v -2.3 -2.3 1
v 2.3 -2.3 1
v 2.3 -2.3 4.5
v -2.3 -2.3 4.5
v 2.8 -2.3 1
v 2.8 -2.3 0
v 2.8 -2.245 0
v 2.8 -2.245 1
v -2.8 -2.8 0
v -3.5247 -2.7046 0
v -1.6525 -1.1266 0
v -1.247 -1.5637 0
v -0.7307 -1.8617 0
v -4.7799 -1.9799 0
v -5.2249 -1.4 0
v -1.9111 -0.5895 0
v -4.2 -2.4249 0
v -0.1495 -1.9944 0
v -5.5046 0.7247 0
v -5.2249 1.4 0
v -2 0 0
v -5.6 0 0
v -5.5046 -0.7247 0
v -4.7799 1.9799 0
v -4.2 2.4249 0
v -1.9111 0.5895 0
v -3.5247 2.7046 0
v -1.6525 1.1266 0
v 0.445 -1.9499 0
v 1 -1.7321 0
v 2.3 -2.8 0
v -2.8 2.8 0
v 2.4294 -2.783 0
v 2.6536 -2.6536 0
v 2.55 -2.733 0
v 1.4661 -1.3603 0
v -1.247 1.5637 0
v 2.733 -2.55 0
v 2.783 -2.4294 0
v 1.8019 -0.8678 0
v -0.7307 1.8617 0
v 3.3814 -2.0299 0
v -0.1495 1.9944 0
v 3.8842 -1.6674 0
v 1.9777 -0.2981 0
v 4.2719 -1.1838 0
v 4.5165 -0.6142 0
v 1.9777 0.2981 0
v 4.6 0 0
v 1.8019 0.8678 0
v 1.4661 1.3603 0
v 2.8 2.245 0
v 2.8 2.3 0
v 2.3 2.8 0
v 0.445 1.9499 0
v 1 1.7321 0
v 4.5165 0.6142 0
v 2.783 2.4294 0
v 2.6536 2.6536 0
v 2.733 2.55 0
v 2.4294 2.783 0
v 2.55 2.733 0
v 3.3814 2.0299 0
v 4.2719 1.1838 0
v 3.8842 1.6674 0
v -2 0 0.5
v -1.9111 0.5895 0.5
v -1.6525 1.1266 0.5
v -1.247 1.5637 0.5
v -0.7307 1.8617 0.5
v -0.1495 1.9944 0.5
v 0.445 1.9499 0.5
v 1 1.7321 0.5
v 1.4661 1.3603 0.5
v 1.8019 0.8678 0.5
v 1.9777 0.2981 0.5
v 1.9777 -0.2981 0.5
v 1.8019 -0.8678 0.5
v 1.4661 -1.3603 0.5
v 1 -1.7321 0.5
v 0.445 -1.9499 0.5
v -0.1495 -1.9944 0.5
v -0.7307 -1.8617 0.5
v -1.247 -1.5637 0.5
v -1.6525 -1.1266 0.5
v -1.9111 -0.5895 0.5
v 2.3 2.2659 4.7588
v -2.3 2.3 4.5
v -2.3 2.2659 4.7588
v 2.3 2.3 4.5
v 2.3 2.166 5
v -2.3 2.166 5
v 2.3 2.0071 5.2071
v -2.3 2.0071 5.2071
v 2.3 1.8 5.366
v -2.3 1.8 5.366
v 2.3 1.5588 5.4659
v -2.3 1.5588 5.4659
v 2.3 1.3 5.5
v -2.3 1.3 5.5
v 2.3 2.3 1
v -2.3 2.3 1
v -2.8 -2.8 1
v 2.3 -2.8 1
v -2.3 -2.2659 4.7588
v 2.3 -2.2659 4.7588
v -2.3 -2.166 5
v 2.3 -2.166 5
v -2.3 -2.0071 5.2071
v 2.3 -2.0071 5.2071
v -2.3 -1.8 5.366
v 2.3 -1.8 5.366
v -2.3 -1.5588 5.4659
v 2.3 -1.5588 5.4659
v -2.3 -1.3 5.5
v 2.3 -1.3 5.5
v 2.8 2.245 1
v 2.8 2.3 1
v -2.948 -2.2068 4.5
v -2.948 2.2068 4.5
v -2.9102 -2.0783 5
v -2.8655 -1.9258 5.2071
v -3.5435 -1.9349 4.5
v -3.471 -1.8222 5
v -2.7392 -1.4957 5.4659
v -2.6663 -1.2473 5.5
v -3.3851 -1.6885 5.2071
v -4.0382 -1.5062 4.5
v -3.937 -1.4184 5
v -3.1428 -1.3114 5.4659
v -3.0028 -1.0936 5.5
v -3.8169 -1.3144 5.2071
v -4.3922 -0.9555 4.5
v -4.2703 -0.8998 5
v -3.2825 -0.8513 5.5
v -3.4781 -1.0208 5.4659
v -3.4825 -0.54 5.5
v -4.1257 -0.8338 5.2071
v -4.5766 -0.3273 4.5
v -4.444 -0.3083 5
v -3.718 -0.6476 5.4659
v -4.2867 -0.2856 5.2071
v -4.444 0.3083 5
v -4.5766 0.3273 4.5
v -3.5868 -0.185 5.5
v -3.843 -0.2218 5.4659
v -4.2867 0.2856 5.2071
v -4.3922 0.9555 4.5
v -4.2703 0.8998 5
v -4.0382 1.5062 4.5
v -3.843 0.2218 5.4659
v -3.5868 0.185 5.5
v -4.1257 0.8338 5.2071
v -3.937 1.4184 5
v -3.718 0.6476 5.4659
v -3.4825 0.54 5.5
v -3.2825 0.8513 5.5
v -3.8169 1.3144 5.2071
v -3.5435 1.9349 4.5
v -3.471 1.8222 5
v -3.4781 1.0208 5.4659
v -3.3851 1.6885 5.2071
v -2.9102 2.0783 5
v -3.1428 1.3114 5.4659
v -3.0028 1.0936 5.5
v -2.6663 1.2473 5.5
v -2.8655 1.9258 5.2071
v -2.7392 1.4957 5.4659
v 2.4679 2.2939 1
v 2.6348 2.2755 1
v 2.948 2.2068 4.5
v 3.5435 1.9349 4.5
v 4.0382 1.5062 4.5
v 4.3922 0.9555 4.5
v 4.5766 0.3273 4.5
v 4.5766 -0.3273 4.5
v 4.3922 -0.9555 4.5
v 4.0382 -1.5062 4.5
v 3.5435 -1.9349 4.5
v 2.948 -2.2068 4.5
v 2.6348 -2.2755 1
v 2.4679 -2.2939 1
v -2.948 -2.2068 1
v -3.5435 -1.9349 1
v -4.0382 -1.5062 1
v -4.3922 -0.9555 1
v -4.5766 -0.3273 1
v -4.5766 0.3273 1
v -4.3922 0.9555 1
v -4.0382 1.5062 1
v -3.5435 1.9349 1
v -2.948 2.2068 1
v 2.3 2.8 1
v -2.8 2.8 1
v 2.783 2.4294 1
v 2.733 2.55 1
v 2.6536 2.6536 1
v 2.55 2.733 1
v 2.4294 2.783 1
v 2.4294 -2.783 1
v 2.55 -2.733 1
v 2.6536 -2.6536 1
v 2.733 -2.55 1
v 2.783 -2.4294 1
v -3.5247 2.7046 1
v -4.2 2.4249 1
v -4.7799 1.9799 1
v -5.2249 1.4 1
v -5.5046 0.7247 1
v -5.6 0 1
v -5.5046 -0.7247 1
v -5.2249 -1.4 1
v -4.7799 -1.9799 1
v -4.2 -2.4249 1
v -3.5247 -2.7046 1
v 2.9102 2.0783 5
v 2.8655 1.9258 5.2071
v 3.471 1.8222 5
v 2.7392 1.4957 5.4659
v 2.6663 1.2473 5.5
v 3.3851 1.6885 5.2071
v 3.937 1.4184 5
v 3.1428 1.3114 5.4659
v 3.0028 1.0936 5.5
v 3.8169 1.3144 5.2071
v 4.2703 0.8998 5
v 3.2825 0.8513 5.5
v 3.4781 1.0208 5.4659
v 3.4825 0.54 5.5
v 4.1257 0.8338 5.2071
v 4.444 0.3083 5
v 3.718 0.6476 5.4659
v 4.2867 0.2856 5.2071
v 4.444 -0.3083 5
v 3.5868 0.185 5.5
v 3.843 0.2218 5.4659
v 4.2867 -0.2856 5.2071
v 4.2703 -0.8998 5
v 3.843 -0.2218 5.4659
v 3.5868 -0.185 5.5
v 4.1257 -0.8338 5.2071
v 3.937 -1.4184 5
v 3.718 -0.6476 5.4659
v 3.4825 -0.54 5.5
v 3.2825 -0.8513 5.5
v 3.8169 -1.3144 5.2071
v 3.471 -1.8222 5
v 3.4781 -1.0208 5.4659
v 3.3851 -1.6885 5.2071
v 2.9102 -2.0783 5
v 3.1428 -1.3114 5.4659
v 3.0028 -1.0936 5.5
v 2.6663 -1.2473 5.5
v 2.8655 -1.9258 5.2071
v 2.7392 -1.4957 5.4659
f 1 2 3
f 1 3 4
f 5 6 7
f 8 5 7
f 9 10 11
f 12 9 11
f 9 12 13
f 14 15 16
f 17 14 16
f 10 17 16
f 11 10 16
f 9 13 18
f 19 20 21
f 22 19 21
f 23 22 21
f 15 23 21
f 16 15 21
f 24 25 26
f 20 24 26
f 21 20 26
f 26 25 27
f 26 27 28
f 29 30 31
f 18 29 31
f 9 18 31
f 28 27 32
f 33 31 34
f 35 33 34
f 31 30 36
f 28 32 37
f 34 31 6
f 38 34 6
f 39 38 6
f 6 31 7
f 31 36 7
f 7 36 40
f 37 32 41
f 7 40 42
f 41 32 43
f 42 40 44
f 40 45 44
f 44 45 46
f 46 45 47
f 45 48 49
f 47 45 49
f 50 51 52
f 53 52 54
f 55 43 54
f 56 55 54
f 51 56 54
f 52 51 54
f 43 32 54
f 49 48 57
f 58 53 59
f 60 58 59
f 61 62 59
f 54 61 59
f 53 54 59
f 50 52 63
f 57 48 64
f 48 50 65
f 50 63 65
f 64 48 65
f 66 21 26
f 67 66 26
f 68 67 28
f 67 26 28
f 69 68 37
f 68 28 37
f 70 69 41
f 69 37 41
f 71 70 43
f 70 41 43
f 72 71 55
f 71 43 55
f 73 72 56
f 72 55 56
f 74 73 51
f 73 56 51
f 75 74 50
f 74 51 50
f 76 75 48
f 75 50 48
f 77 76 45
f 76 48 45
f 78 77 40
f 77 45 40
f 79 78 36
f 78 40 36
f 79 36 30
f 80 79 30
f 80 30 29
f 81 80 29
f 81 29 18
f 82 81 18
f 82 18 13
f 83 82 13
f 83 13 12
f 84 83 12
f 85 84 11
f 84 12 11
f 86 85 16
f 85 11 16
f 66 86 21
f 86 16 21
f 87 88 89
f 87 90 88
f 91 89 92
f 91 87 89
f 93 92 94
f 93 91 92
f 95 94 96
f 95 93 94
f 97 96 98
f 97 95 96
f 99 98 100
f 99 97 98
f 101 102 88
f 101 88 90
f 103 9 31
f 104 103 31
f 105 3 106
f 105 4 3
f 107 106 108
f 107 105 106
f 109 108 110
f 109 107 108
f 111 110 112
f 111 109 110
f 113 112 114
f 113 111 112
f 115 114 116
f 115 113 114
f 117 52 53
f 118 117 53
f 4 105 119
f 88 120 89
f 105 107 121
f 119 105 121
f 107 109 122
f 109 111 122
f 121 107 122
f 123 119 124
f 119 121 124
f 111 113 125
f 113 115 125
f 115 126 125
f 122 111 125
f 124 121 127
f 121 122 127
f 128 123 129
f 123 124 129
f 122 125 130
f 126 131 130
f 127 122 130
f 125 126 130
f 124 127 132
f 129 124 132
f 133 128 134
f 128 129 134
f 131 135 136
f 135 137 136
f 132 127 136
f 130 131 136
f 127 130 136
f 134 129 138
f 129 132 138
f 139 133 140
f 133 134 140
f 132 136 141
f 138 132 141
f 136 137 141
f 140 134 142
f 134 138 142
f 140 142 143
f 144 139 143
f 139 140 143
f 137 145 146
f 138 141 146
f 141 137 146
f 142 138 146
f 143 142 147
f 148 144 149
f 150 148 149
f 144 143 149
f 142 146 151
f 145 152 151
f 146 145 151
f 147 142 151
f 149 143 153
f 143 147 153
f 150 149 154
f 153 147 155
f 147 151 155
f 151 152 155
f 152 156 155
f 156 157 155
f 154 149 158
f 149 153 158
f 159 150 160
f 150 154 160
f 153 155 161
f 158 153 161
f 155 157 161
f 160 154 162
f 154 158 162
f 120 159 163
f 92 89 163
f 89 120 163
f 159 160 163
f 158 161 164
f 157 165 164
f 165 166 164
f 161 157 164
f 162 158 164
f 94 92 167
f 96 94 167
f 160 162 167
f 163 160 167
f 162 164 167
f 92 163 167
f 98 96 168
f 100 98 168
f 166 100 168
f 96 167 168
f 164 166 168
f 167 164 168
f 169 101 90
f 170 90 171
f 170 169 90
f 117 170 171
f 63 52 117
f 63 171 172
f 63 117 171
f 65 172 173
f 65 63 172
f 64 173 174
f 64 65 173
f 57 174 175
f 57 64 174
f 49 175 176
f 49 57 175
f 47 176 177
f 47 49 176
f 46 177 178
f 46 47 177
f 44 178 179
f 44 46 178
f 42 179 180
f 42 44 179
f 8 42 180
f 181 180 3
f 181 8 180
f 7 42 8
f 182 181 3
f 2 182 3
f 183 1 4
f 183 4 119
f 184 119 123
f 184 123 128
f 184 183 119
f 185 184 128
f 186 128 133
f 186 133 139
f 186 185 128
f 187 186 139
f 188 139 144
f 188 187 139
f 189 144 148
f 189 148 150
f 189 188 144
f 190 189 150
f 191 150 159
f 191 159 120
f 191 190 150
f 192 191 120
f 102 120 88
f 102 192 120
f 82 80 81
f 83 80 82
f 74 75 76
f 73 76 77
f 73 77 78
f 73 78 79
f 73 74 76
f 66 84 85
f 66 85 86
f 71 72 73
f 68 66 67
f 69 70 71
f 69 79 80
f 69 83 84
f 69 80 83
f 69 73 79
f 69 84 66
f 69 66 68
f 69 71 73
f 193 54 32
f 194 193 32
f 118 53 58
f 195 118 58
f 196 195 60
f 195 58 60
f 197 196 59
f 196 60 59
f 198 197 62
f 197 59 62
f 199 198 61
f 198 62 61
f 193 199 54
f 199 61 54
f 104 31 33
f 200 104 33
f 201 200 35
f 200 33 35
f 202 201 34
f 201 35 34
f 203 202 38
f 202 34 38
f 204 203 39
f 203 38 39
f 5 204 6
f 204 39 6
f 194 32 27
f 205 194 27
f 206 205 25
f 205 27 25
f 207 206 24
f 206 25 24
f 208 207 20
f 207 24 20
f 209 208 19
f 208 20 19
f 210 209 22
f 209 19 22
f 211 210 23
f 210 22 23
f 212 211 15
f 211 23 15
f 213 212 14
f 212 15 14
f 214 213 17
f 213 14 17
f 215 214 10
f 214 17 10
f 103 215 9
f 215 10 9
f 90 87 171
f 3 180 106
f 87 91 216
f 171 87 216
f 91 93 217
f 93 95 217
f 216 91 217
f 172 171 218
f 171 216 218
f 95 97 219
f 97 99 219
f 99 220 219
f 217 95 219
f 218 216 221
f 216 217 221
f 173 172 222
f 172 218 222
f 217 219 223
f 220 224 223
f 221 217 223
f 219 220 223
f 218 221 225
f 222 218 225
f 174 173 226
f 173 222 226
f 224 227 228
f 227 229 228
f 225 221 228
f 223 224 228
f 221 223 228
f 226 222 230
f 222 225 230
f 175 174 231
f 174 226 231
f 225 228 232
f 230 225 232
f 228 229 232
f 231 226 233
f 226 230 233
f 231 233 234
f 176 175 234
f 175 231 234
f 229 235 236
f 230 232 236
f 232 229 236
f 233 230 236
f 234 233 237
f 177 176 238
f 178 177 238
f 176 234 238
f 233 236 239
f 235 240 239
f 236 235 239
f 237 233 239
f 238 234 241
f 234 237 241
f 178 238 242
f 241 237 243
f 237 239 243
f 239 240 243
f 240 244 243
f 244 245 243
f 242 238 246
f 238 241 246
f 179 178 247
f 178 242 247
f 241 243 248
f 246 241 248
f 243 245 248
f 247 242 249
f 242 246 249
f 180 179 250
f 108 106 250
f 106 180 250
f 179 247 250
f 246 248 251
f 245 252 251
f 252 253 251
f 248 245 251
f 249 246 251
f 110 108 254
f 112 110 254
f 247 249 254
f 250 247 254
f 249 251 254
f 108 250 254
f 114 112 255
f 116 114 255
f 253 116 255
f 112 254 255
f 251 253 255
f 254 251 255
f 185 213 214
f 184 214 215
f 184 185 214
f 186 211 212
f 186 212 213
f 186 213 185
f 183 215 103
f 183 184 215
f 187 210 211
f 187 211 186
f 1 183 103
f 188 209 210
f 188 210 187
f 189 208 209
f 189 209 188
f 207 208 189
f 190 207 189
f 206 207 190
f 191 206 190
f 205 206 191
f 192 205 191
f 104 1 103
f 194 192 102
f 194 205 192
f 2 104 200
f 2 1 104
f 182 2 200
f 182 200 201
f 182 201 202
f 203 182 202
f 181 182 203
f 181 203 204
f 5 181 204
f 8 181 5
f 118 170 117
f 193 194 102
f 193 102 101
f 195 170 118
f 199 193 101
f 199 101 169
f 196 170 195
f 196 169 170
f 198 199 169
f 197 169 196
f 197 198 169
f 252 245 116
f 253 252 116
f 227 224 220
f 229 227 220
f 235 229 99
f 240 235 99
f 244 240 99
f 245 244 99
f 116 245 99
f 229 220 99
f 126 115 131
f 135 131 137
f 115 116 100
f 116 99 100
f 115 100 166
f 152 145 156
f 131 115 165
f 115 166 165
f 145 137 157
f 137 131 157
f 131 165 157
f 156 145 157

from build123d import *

# Parameters (mm, degrees)
EXTRUDE_1_DEPTH     = 5.5
EXTRUDE_2_DEPTH     = 1
SKETCH_3_R          = 2
CUT_EXTRUDE_1_DEPTH = 0.5
FILLET_1_R          = 1


with BuildPart() as part:
    # 草图1 → 凸台-拉伸1 (new body)
    with BuildSketch(Plane.XY):
        with BuildLine():
            Line((2.3, -2.3), (-2.3, -2.3))
            ThreePointArc((-2.3, -2.3), (-4.6, 0), (-2.3, 2.3))
            Line((-2.3, 2.3), (2.3, 2.3))
            ThreePointArc((2.3, 2.3), (4.6, 0), (2.3, -2.3))
        make_face()
    extrude(amount=EXTRUDE_1_DEPTH)

    # 草图2 → 凸台-拉伸2 (add)
    with BuildSketch(Plane(origin=(0, 0, 0), x_dir=(-1, 0, 0), z_dir=(0, 0, -1))):
        with BuildLine():
            Line((2.8, -2.8), (-2.3, -2.8))
            ThreePointArc((-2.3, -2.8), (-2.653553391, -2.653553391), (-2.8, -2.3))
            Line((-2.8, -2.3), (-2.8, 2.3))
            ThreePointArc((-2.8, 2.3), (-2.653553391, 2.653553391), (-2.3, 2.8))
            Line((-2.3, 2.8), (2.8, 2.8))
            ThreePointArc((2.8, 2.8), (5.6, 0), (2.8, -2.8))
        make_face()
    extrude(amount=-EXTRUDE_2_DEPTH)

    # 草图3 → 切除-拉伸1 (cut)
    with BuildSketch(Plane(origin=(0, 0, 0), x_dir=(-1, 0, 0), z_dir=(0, 0, -1))):
        Circle(SKETCH_3_R)
    extrude(amount=-CUT_EXTRUDE_1_DEPTH, mode=Mode.SUBTRACT)

    # 圆角1
    fillet_1_edges = [part.edges().sort_by_distance(p)[0] for p in [
        (-4.6, 0, 5.5),
        (0, -2.3, 5.5),
        (4.6, 0, 5.5),
        (0, 2.3, 5.5),
    ]]
    fillet(fillet_1_edges, radius=FILLET_1_R)


solid = part.part
